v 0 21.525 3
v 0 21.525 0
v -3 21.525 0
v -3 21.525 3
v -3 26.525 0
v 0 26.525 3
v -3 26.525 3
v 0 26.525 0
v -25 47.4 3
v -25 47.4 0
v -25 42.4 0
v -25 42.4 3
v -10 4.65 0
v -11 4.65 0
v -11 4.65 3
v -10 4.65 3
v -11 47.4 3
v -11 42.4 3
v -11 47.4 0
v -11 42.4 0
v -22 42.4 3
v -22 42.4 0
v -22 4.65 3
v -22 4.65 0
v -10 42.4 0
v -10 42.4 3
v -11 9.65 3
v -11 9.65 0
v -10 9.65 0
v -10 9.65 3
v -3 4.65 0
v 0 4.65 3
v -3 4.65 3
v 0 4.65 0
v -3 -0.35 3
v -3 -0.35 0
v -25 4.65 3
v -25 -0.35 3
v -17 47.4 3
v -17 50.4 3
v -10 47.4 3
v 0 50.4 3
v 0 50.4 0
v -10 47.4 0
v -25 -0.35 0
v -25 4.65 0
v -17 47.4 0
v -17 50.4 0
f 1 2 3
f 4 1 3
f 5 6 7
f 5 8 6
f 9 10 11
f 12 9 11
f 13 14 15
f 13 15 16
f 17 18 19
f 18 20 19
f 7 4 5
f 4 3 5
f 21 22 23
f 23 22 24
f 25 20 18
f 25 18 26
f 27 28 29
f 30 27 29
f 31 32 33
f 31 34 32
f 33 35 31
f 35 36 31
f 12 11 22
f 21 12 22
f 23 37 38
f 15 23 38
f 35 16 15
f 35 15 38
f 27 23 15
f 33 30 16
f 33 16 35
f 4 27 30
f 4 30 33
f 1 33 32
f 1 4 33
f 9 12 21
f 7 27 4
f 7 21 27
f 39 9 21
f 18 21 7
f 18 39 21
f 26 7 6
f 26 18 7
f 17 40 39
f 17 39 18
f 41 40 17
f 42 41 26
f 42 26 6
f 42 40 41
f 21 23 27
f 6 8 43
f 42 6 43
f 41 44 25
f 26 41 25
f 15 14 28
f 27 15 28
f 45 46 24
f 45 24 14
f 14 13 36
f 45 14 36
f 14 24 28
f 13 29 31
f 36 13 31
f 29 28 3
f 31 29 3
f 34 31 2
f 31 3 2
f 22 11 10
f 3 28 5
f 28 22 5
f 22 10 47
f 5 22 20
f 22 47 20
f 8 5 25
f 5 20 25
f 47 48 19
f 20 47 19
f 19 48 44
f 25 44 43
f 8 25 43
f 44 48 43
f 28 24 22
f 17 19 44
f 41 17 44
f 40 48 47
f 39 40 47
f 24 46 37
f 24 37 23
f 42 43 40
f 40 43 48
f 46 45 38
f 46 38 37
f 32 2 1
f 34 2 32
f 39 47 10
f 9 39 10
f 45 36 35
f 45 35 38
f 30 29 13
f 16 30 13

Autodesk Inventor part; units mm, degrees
ref_plane "YZ Plane" through (0, 0, 0) normal (1, 0, 0) x (0, 1, 0)
ref_plane "XZ Plane" through (0, 0, 0) normal (0, 1, 0) x (-1, 0, 0)
ref_plane "XY Plane" through (0, 0, 0) normal (0, 0, 1) x (1, 0, 0)
sketch "Sketch1" plane through (0, 0, 0) normal (0, 0, 1) x (1, 0, 0)
  line L0 (-3, 4.65) -> (-3, 21.525)
  line L1 (0, 4.65) -> (-3, 4.65)
  line L2 (0, 21.525) -> (0, 4.65)
  line L3 (0, 21.525) -> (-3, 21.525)
  line L4 (-3, -0.35) -> (-3, 4.65)
  line L5 (-3, -0.35) -> (-22, -0.35)
  line L6 (-3, 21.525) -> (-3, 26.525)
  line L7 (-3, 26.525) -> (-3, 47.4)
  line L8 (0, 26.525) -> (-3, 26.525)
  line L9 (0, 47.4) -> (0, 26.525)
  line L10 (0, 47.4) -> (-3, 47.4)
  line L11 (-10, 47.4) -> (-10, 42.4)
  line L12 (-11, 47.4) -> (-10, 47.4)
  line L13 (-11, 42.4) -> (-11, 47.4)
  line L14 (-11, 42.4) -> (-10, 42.4)
  line L15 (-10, 9.65) -> (-10, 4.65)
  line L16 (-11, 9.65) -> (-10, 9.65)
  line L17 (-11, 4.65) -> (-11, 9.65)
  line L18 (-11, 4.65) -> (-10, 4.65)
  line L19 (0, 47.4) -> (0, 50.4)
  line L20 (0, 50.4) -> (-22, 50.4)
  line L21 (-22, 50.4) -> (-22, -0.35)
  line L22 (-22, -0.35) -> (-25, -0.35)
  line L23 (-25, -0.35) -> (-25, 4.65)
  line L24 (-25, 4.65) -> (-22, 4.65)
  line L25 (-22, 4.65) -> (-22, -0.35)
  line L26 (-22, 47.4) -> (-25, 47.4)
  line L27 (-25, 47.4) -> (-25, 42.4)
  line L28 (-25, 42.4) -> (-22, 42.4)
  line L29 (-22, 42.4) -> (-22, 47.4)
  line L30 (-22, 50.4) -> (-17, 50.4)
  line L31 (-17, 50.4) -> (-17, 47.4)
  line L32 (-17, 47.4) -> (-22, 47.4)
  line L33 (-22, 47.4) -> (-22, 50.4)
  line L34 (-25, -0.35) -> (-25, -5.35)
  point P0 (0, 0)
extrude "Extrusion1" add sketch "Sketch1" along normal blind 3 contours L4 L5 L21 L32 L31 L20 L19 L10 L7 L6 L0 | L0 L3 L2 L1 | L7 L10 L9 L8 | L22 L23 L24 L21 | L28 L27 L26 L21
properties part number "SideLeftLower" material "Acrylic, Clear"
